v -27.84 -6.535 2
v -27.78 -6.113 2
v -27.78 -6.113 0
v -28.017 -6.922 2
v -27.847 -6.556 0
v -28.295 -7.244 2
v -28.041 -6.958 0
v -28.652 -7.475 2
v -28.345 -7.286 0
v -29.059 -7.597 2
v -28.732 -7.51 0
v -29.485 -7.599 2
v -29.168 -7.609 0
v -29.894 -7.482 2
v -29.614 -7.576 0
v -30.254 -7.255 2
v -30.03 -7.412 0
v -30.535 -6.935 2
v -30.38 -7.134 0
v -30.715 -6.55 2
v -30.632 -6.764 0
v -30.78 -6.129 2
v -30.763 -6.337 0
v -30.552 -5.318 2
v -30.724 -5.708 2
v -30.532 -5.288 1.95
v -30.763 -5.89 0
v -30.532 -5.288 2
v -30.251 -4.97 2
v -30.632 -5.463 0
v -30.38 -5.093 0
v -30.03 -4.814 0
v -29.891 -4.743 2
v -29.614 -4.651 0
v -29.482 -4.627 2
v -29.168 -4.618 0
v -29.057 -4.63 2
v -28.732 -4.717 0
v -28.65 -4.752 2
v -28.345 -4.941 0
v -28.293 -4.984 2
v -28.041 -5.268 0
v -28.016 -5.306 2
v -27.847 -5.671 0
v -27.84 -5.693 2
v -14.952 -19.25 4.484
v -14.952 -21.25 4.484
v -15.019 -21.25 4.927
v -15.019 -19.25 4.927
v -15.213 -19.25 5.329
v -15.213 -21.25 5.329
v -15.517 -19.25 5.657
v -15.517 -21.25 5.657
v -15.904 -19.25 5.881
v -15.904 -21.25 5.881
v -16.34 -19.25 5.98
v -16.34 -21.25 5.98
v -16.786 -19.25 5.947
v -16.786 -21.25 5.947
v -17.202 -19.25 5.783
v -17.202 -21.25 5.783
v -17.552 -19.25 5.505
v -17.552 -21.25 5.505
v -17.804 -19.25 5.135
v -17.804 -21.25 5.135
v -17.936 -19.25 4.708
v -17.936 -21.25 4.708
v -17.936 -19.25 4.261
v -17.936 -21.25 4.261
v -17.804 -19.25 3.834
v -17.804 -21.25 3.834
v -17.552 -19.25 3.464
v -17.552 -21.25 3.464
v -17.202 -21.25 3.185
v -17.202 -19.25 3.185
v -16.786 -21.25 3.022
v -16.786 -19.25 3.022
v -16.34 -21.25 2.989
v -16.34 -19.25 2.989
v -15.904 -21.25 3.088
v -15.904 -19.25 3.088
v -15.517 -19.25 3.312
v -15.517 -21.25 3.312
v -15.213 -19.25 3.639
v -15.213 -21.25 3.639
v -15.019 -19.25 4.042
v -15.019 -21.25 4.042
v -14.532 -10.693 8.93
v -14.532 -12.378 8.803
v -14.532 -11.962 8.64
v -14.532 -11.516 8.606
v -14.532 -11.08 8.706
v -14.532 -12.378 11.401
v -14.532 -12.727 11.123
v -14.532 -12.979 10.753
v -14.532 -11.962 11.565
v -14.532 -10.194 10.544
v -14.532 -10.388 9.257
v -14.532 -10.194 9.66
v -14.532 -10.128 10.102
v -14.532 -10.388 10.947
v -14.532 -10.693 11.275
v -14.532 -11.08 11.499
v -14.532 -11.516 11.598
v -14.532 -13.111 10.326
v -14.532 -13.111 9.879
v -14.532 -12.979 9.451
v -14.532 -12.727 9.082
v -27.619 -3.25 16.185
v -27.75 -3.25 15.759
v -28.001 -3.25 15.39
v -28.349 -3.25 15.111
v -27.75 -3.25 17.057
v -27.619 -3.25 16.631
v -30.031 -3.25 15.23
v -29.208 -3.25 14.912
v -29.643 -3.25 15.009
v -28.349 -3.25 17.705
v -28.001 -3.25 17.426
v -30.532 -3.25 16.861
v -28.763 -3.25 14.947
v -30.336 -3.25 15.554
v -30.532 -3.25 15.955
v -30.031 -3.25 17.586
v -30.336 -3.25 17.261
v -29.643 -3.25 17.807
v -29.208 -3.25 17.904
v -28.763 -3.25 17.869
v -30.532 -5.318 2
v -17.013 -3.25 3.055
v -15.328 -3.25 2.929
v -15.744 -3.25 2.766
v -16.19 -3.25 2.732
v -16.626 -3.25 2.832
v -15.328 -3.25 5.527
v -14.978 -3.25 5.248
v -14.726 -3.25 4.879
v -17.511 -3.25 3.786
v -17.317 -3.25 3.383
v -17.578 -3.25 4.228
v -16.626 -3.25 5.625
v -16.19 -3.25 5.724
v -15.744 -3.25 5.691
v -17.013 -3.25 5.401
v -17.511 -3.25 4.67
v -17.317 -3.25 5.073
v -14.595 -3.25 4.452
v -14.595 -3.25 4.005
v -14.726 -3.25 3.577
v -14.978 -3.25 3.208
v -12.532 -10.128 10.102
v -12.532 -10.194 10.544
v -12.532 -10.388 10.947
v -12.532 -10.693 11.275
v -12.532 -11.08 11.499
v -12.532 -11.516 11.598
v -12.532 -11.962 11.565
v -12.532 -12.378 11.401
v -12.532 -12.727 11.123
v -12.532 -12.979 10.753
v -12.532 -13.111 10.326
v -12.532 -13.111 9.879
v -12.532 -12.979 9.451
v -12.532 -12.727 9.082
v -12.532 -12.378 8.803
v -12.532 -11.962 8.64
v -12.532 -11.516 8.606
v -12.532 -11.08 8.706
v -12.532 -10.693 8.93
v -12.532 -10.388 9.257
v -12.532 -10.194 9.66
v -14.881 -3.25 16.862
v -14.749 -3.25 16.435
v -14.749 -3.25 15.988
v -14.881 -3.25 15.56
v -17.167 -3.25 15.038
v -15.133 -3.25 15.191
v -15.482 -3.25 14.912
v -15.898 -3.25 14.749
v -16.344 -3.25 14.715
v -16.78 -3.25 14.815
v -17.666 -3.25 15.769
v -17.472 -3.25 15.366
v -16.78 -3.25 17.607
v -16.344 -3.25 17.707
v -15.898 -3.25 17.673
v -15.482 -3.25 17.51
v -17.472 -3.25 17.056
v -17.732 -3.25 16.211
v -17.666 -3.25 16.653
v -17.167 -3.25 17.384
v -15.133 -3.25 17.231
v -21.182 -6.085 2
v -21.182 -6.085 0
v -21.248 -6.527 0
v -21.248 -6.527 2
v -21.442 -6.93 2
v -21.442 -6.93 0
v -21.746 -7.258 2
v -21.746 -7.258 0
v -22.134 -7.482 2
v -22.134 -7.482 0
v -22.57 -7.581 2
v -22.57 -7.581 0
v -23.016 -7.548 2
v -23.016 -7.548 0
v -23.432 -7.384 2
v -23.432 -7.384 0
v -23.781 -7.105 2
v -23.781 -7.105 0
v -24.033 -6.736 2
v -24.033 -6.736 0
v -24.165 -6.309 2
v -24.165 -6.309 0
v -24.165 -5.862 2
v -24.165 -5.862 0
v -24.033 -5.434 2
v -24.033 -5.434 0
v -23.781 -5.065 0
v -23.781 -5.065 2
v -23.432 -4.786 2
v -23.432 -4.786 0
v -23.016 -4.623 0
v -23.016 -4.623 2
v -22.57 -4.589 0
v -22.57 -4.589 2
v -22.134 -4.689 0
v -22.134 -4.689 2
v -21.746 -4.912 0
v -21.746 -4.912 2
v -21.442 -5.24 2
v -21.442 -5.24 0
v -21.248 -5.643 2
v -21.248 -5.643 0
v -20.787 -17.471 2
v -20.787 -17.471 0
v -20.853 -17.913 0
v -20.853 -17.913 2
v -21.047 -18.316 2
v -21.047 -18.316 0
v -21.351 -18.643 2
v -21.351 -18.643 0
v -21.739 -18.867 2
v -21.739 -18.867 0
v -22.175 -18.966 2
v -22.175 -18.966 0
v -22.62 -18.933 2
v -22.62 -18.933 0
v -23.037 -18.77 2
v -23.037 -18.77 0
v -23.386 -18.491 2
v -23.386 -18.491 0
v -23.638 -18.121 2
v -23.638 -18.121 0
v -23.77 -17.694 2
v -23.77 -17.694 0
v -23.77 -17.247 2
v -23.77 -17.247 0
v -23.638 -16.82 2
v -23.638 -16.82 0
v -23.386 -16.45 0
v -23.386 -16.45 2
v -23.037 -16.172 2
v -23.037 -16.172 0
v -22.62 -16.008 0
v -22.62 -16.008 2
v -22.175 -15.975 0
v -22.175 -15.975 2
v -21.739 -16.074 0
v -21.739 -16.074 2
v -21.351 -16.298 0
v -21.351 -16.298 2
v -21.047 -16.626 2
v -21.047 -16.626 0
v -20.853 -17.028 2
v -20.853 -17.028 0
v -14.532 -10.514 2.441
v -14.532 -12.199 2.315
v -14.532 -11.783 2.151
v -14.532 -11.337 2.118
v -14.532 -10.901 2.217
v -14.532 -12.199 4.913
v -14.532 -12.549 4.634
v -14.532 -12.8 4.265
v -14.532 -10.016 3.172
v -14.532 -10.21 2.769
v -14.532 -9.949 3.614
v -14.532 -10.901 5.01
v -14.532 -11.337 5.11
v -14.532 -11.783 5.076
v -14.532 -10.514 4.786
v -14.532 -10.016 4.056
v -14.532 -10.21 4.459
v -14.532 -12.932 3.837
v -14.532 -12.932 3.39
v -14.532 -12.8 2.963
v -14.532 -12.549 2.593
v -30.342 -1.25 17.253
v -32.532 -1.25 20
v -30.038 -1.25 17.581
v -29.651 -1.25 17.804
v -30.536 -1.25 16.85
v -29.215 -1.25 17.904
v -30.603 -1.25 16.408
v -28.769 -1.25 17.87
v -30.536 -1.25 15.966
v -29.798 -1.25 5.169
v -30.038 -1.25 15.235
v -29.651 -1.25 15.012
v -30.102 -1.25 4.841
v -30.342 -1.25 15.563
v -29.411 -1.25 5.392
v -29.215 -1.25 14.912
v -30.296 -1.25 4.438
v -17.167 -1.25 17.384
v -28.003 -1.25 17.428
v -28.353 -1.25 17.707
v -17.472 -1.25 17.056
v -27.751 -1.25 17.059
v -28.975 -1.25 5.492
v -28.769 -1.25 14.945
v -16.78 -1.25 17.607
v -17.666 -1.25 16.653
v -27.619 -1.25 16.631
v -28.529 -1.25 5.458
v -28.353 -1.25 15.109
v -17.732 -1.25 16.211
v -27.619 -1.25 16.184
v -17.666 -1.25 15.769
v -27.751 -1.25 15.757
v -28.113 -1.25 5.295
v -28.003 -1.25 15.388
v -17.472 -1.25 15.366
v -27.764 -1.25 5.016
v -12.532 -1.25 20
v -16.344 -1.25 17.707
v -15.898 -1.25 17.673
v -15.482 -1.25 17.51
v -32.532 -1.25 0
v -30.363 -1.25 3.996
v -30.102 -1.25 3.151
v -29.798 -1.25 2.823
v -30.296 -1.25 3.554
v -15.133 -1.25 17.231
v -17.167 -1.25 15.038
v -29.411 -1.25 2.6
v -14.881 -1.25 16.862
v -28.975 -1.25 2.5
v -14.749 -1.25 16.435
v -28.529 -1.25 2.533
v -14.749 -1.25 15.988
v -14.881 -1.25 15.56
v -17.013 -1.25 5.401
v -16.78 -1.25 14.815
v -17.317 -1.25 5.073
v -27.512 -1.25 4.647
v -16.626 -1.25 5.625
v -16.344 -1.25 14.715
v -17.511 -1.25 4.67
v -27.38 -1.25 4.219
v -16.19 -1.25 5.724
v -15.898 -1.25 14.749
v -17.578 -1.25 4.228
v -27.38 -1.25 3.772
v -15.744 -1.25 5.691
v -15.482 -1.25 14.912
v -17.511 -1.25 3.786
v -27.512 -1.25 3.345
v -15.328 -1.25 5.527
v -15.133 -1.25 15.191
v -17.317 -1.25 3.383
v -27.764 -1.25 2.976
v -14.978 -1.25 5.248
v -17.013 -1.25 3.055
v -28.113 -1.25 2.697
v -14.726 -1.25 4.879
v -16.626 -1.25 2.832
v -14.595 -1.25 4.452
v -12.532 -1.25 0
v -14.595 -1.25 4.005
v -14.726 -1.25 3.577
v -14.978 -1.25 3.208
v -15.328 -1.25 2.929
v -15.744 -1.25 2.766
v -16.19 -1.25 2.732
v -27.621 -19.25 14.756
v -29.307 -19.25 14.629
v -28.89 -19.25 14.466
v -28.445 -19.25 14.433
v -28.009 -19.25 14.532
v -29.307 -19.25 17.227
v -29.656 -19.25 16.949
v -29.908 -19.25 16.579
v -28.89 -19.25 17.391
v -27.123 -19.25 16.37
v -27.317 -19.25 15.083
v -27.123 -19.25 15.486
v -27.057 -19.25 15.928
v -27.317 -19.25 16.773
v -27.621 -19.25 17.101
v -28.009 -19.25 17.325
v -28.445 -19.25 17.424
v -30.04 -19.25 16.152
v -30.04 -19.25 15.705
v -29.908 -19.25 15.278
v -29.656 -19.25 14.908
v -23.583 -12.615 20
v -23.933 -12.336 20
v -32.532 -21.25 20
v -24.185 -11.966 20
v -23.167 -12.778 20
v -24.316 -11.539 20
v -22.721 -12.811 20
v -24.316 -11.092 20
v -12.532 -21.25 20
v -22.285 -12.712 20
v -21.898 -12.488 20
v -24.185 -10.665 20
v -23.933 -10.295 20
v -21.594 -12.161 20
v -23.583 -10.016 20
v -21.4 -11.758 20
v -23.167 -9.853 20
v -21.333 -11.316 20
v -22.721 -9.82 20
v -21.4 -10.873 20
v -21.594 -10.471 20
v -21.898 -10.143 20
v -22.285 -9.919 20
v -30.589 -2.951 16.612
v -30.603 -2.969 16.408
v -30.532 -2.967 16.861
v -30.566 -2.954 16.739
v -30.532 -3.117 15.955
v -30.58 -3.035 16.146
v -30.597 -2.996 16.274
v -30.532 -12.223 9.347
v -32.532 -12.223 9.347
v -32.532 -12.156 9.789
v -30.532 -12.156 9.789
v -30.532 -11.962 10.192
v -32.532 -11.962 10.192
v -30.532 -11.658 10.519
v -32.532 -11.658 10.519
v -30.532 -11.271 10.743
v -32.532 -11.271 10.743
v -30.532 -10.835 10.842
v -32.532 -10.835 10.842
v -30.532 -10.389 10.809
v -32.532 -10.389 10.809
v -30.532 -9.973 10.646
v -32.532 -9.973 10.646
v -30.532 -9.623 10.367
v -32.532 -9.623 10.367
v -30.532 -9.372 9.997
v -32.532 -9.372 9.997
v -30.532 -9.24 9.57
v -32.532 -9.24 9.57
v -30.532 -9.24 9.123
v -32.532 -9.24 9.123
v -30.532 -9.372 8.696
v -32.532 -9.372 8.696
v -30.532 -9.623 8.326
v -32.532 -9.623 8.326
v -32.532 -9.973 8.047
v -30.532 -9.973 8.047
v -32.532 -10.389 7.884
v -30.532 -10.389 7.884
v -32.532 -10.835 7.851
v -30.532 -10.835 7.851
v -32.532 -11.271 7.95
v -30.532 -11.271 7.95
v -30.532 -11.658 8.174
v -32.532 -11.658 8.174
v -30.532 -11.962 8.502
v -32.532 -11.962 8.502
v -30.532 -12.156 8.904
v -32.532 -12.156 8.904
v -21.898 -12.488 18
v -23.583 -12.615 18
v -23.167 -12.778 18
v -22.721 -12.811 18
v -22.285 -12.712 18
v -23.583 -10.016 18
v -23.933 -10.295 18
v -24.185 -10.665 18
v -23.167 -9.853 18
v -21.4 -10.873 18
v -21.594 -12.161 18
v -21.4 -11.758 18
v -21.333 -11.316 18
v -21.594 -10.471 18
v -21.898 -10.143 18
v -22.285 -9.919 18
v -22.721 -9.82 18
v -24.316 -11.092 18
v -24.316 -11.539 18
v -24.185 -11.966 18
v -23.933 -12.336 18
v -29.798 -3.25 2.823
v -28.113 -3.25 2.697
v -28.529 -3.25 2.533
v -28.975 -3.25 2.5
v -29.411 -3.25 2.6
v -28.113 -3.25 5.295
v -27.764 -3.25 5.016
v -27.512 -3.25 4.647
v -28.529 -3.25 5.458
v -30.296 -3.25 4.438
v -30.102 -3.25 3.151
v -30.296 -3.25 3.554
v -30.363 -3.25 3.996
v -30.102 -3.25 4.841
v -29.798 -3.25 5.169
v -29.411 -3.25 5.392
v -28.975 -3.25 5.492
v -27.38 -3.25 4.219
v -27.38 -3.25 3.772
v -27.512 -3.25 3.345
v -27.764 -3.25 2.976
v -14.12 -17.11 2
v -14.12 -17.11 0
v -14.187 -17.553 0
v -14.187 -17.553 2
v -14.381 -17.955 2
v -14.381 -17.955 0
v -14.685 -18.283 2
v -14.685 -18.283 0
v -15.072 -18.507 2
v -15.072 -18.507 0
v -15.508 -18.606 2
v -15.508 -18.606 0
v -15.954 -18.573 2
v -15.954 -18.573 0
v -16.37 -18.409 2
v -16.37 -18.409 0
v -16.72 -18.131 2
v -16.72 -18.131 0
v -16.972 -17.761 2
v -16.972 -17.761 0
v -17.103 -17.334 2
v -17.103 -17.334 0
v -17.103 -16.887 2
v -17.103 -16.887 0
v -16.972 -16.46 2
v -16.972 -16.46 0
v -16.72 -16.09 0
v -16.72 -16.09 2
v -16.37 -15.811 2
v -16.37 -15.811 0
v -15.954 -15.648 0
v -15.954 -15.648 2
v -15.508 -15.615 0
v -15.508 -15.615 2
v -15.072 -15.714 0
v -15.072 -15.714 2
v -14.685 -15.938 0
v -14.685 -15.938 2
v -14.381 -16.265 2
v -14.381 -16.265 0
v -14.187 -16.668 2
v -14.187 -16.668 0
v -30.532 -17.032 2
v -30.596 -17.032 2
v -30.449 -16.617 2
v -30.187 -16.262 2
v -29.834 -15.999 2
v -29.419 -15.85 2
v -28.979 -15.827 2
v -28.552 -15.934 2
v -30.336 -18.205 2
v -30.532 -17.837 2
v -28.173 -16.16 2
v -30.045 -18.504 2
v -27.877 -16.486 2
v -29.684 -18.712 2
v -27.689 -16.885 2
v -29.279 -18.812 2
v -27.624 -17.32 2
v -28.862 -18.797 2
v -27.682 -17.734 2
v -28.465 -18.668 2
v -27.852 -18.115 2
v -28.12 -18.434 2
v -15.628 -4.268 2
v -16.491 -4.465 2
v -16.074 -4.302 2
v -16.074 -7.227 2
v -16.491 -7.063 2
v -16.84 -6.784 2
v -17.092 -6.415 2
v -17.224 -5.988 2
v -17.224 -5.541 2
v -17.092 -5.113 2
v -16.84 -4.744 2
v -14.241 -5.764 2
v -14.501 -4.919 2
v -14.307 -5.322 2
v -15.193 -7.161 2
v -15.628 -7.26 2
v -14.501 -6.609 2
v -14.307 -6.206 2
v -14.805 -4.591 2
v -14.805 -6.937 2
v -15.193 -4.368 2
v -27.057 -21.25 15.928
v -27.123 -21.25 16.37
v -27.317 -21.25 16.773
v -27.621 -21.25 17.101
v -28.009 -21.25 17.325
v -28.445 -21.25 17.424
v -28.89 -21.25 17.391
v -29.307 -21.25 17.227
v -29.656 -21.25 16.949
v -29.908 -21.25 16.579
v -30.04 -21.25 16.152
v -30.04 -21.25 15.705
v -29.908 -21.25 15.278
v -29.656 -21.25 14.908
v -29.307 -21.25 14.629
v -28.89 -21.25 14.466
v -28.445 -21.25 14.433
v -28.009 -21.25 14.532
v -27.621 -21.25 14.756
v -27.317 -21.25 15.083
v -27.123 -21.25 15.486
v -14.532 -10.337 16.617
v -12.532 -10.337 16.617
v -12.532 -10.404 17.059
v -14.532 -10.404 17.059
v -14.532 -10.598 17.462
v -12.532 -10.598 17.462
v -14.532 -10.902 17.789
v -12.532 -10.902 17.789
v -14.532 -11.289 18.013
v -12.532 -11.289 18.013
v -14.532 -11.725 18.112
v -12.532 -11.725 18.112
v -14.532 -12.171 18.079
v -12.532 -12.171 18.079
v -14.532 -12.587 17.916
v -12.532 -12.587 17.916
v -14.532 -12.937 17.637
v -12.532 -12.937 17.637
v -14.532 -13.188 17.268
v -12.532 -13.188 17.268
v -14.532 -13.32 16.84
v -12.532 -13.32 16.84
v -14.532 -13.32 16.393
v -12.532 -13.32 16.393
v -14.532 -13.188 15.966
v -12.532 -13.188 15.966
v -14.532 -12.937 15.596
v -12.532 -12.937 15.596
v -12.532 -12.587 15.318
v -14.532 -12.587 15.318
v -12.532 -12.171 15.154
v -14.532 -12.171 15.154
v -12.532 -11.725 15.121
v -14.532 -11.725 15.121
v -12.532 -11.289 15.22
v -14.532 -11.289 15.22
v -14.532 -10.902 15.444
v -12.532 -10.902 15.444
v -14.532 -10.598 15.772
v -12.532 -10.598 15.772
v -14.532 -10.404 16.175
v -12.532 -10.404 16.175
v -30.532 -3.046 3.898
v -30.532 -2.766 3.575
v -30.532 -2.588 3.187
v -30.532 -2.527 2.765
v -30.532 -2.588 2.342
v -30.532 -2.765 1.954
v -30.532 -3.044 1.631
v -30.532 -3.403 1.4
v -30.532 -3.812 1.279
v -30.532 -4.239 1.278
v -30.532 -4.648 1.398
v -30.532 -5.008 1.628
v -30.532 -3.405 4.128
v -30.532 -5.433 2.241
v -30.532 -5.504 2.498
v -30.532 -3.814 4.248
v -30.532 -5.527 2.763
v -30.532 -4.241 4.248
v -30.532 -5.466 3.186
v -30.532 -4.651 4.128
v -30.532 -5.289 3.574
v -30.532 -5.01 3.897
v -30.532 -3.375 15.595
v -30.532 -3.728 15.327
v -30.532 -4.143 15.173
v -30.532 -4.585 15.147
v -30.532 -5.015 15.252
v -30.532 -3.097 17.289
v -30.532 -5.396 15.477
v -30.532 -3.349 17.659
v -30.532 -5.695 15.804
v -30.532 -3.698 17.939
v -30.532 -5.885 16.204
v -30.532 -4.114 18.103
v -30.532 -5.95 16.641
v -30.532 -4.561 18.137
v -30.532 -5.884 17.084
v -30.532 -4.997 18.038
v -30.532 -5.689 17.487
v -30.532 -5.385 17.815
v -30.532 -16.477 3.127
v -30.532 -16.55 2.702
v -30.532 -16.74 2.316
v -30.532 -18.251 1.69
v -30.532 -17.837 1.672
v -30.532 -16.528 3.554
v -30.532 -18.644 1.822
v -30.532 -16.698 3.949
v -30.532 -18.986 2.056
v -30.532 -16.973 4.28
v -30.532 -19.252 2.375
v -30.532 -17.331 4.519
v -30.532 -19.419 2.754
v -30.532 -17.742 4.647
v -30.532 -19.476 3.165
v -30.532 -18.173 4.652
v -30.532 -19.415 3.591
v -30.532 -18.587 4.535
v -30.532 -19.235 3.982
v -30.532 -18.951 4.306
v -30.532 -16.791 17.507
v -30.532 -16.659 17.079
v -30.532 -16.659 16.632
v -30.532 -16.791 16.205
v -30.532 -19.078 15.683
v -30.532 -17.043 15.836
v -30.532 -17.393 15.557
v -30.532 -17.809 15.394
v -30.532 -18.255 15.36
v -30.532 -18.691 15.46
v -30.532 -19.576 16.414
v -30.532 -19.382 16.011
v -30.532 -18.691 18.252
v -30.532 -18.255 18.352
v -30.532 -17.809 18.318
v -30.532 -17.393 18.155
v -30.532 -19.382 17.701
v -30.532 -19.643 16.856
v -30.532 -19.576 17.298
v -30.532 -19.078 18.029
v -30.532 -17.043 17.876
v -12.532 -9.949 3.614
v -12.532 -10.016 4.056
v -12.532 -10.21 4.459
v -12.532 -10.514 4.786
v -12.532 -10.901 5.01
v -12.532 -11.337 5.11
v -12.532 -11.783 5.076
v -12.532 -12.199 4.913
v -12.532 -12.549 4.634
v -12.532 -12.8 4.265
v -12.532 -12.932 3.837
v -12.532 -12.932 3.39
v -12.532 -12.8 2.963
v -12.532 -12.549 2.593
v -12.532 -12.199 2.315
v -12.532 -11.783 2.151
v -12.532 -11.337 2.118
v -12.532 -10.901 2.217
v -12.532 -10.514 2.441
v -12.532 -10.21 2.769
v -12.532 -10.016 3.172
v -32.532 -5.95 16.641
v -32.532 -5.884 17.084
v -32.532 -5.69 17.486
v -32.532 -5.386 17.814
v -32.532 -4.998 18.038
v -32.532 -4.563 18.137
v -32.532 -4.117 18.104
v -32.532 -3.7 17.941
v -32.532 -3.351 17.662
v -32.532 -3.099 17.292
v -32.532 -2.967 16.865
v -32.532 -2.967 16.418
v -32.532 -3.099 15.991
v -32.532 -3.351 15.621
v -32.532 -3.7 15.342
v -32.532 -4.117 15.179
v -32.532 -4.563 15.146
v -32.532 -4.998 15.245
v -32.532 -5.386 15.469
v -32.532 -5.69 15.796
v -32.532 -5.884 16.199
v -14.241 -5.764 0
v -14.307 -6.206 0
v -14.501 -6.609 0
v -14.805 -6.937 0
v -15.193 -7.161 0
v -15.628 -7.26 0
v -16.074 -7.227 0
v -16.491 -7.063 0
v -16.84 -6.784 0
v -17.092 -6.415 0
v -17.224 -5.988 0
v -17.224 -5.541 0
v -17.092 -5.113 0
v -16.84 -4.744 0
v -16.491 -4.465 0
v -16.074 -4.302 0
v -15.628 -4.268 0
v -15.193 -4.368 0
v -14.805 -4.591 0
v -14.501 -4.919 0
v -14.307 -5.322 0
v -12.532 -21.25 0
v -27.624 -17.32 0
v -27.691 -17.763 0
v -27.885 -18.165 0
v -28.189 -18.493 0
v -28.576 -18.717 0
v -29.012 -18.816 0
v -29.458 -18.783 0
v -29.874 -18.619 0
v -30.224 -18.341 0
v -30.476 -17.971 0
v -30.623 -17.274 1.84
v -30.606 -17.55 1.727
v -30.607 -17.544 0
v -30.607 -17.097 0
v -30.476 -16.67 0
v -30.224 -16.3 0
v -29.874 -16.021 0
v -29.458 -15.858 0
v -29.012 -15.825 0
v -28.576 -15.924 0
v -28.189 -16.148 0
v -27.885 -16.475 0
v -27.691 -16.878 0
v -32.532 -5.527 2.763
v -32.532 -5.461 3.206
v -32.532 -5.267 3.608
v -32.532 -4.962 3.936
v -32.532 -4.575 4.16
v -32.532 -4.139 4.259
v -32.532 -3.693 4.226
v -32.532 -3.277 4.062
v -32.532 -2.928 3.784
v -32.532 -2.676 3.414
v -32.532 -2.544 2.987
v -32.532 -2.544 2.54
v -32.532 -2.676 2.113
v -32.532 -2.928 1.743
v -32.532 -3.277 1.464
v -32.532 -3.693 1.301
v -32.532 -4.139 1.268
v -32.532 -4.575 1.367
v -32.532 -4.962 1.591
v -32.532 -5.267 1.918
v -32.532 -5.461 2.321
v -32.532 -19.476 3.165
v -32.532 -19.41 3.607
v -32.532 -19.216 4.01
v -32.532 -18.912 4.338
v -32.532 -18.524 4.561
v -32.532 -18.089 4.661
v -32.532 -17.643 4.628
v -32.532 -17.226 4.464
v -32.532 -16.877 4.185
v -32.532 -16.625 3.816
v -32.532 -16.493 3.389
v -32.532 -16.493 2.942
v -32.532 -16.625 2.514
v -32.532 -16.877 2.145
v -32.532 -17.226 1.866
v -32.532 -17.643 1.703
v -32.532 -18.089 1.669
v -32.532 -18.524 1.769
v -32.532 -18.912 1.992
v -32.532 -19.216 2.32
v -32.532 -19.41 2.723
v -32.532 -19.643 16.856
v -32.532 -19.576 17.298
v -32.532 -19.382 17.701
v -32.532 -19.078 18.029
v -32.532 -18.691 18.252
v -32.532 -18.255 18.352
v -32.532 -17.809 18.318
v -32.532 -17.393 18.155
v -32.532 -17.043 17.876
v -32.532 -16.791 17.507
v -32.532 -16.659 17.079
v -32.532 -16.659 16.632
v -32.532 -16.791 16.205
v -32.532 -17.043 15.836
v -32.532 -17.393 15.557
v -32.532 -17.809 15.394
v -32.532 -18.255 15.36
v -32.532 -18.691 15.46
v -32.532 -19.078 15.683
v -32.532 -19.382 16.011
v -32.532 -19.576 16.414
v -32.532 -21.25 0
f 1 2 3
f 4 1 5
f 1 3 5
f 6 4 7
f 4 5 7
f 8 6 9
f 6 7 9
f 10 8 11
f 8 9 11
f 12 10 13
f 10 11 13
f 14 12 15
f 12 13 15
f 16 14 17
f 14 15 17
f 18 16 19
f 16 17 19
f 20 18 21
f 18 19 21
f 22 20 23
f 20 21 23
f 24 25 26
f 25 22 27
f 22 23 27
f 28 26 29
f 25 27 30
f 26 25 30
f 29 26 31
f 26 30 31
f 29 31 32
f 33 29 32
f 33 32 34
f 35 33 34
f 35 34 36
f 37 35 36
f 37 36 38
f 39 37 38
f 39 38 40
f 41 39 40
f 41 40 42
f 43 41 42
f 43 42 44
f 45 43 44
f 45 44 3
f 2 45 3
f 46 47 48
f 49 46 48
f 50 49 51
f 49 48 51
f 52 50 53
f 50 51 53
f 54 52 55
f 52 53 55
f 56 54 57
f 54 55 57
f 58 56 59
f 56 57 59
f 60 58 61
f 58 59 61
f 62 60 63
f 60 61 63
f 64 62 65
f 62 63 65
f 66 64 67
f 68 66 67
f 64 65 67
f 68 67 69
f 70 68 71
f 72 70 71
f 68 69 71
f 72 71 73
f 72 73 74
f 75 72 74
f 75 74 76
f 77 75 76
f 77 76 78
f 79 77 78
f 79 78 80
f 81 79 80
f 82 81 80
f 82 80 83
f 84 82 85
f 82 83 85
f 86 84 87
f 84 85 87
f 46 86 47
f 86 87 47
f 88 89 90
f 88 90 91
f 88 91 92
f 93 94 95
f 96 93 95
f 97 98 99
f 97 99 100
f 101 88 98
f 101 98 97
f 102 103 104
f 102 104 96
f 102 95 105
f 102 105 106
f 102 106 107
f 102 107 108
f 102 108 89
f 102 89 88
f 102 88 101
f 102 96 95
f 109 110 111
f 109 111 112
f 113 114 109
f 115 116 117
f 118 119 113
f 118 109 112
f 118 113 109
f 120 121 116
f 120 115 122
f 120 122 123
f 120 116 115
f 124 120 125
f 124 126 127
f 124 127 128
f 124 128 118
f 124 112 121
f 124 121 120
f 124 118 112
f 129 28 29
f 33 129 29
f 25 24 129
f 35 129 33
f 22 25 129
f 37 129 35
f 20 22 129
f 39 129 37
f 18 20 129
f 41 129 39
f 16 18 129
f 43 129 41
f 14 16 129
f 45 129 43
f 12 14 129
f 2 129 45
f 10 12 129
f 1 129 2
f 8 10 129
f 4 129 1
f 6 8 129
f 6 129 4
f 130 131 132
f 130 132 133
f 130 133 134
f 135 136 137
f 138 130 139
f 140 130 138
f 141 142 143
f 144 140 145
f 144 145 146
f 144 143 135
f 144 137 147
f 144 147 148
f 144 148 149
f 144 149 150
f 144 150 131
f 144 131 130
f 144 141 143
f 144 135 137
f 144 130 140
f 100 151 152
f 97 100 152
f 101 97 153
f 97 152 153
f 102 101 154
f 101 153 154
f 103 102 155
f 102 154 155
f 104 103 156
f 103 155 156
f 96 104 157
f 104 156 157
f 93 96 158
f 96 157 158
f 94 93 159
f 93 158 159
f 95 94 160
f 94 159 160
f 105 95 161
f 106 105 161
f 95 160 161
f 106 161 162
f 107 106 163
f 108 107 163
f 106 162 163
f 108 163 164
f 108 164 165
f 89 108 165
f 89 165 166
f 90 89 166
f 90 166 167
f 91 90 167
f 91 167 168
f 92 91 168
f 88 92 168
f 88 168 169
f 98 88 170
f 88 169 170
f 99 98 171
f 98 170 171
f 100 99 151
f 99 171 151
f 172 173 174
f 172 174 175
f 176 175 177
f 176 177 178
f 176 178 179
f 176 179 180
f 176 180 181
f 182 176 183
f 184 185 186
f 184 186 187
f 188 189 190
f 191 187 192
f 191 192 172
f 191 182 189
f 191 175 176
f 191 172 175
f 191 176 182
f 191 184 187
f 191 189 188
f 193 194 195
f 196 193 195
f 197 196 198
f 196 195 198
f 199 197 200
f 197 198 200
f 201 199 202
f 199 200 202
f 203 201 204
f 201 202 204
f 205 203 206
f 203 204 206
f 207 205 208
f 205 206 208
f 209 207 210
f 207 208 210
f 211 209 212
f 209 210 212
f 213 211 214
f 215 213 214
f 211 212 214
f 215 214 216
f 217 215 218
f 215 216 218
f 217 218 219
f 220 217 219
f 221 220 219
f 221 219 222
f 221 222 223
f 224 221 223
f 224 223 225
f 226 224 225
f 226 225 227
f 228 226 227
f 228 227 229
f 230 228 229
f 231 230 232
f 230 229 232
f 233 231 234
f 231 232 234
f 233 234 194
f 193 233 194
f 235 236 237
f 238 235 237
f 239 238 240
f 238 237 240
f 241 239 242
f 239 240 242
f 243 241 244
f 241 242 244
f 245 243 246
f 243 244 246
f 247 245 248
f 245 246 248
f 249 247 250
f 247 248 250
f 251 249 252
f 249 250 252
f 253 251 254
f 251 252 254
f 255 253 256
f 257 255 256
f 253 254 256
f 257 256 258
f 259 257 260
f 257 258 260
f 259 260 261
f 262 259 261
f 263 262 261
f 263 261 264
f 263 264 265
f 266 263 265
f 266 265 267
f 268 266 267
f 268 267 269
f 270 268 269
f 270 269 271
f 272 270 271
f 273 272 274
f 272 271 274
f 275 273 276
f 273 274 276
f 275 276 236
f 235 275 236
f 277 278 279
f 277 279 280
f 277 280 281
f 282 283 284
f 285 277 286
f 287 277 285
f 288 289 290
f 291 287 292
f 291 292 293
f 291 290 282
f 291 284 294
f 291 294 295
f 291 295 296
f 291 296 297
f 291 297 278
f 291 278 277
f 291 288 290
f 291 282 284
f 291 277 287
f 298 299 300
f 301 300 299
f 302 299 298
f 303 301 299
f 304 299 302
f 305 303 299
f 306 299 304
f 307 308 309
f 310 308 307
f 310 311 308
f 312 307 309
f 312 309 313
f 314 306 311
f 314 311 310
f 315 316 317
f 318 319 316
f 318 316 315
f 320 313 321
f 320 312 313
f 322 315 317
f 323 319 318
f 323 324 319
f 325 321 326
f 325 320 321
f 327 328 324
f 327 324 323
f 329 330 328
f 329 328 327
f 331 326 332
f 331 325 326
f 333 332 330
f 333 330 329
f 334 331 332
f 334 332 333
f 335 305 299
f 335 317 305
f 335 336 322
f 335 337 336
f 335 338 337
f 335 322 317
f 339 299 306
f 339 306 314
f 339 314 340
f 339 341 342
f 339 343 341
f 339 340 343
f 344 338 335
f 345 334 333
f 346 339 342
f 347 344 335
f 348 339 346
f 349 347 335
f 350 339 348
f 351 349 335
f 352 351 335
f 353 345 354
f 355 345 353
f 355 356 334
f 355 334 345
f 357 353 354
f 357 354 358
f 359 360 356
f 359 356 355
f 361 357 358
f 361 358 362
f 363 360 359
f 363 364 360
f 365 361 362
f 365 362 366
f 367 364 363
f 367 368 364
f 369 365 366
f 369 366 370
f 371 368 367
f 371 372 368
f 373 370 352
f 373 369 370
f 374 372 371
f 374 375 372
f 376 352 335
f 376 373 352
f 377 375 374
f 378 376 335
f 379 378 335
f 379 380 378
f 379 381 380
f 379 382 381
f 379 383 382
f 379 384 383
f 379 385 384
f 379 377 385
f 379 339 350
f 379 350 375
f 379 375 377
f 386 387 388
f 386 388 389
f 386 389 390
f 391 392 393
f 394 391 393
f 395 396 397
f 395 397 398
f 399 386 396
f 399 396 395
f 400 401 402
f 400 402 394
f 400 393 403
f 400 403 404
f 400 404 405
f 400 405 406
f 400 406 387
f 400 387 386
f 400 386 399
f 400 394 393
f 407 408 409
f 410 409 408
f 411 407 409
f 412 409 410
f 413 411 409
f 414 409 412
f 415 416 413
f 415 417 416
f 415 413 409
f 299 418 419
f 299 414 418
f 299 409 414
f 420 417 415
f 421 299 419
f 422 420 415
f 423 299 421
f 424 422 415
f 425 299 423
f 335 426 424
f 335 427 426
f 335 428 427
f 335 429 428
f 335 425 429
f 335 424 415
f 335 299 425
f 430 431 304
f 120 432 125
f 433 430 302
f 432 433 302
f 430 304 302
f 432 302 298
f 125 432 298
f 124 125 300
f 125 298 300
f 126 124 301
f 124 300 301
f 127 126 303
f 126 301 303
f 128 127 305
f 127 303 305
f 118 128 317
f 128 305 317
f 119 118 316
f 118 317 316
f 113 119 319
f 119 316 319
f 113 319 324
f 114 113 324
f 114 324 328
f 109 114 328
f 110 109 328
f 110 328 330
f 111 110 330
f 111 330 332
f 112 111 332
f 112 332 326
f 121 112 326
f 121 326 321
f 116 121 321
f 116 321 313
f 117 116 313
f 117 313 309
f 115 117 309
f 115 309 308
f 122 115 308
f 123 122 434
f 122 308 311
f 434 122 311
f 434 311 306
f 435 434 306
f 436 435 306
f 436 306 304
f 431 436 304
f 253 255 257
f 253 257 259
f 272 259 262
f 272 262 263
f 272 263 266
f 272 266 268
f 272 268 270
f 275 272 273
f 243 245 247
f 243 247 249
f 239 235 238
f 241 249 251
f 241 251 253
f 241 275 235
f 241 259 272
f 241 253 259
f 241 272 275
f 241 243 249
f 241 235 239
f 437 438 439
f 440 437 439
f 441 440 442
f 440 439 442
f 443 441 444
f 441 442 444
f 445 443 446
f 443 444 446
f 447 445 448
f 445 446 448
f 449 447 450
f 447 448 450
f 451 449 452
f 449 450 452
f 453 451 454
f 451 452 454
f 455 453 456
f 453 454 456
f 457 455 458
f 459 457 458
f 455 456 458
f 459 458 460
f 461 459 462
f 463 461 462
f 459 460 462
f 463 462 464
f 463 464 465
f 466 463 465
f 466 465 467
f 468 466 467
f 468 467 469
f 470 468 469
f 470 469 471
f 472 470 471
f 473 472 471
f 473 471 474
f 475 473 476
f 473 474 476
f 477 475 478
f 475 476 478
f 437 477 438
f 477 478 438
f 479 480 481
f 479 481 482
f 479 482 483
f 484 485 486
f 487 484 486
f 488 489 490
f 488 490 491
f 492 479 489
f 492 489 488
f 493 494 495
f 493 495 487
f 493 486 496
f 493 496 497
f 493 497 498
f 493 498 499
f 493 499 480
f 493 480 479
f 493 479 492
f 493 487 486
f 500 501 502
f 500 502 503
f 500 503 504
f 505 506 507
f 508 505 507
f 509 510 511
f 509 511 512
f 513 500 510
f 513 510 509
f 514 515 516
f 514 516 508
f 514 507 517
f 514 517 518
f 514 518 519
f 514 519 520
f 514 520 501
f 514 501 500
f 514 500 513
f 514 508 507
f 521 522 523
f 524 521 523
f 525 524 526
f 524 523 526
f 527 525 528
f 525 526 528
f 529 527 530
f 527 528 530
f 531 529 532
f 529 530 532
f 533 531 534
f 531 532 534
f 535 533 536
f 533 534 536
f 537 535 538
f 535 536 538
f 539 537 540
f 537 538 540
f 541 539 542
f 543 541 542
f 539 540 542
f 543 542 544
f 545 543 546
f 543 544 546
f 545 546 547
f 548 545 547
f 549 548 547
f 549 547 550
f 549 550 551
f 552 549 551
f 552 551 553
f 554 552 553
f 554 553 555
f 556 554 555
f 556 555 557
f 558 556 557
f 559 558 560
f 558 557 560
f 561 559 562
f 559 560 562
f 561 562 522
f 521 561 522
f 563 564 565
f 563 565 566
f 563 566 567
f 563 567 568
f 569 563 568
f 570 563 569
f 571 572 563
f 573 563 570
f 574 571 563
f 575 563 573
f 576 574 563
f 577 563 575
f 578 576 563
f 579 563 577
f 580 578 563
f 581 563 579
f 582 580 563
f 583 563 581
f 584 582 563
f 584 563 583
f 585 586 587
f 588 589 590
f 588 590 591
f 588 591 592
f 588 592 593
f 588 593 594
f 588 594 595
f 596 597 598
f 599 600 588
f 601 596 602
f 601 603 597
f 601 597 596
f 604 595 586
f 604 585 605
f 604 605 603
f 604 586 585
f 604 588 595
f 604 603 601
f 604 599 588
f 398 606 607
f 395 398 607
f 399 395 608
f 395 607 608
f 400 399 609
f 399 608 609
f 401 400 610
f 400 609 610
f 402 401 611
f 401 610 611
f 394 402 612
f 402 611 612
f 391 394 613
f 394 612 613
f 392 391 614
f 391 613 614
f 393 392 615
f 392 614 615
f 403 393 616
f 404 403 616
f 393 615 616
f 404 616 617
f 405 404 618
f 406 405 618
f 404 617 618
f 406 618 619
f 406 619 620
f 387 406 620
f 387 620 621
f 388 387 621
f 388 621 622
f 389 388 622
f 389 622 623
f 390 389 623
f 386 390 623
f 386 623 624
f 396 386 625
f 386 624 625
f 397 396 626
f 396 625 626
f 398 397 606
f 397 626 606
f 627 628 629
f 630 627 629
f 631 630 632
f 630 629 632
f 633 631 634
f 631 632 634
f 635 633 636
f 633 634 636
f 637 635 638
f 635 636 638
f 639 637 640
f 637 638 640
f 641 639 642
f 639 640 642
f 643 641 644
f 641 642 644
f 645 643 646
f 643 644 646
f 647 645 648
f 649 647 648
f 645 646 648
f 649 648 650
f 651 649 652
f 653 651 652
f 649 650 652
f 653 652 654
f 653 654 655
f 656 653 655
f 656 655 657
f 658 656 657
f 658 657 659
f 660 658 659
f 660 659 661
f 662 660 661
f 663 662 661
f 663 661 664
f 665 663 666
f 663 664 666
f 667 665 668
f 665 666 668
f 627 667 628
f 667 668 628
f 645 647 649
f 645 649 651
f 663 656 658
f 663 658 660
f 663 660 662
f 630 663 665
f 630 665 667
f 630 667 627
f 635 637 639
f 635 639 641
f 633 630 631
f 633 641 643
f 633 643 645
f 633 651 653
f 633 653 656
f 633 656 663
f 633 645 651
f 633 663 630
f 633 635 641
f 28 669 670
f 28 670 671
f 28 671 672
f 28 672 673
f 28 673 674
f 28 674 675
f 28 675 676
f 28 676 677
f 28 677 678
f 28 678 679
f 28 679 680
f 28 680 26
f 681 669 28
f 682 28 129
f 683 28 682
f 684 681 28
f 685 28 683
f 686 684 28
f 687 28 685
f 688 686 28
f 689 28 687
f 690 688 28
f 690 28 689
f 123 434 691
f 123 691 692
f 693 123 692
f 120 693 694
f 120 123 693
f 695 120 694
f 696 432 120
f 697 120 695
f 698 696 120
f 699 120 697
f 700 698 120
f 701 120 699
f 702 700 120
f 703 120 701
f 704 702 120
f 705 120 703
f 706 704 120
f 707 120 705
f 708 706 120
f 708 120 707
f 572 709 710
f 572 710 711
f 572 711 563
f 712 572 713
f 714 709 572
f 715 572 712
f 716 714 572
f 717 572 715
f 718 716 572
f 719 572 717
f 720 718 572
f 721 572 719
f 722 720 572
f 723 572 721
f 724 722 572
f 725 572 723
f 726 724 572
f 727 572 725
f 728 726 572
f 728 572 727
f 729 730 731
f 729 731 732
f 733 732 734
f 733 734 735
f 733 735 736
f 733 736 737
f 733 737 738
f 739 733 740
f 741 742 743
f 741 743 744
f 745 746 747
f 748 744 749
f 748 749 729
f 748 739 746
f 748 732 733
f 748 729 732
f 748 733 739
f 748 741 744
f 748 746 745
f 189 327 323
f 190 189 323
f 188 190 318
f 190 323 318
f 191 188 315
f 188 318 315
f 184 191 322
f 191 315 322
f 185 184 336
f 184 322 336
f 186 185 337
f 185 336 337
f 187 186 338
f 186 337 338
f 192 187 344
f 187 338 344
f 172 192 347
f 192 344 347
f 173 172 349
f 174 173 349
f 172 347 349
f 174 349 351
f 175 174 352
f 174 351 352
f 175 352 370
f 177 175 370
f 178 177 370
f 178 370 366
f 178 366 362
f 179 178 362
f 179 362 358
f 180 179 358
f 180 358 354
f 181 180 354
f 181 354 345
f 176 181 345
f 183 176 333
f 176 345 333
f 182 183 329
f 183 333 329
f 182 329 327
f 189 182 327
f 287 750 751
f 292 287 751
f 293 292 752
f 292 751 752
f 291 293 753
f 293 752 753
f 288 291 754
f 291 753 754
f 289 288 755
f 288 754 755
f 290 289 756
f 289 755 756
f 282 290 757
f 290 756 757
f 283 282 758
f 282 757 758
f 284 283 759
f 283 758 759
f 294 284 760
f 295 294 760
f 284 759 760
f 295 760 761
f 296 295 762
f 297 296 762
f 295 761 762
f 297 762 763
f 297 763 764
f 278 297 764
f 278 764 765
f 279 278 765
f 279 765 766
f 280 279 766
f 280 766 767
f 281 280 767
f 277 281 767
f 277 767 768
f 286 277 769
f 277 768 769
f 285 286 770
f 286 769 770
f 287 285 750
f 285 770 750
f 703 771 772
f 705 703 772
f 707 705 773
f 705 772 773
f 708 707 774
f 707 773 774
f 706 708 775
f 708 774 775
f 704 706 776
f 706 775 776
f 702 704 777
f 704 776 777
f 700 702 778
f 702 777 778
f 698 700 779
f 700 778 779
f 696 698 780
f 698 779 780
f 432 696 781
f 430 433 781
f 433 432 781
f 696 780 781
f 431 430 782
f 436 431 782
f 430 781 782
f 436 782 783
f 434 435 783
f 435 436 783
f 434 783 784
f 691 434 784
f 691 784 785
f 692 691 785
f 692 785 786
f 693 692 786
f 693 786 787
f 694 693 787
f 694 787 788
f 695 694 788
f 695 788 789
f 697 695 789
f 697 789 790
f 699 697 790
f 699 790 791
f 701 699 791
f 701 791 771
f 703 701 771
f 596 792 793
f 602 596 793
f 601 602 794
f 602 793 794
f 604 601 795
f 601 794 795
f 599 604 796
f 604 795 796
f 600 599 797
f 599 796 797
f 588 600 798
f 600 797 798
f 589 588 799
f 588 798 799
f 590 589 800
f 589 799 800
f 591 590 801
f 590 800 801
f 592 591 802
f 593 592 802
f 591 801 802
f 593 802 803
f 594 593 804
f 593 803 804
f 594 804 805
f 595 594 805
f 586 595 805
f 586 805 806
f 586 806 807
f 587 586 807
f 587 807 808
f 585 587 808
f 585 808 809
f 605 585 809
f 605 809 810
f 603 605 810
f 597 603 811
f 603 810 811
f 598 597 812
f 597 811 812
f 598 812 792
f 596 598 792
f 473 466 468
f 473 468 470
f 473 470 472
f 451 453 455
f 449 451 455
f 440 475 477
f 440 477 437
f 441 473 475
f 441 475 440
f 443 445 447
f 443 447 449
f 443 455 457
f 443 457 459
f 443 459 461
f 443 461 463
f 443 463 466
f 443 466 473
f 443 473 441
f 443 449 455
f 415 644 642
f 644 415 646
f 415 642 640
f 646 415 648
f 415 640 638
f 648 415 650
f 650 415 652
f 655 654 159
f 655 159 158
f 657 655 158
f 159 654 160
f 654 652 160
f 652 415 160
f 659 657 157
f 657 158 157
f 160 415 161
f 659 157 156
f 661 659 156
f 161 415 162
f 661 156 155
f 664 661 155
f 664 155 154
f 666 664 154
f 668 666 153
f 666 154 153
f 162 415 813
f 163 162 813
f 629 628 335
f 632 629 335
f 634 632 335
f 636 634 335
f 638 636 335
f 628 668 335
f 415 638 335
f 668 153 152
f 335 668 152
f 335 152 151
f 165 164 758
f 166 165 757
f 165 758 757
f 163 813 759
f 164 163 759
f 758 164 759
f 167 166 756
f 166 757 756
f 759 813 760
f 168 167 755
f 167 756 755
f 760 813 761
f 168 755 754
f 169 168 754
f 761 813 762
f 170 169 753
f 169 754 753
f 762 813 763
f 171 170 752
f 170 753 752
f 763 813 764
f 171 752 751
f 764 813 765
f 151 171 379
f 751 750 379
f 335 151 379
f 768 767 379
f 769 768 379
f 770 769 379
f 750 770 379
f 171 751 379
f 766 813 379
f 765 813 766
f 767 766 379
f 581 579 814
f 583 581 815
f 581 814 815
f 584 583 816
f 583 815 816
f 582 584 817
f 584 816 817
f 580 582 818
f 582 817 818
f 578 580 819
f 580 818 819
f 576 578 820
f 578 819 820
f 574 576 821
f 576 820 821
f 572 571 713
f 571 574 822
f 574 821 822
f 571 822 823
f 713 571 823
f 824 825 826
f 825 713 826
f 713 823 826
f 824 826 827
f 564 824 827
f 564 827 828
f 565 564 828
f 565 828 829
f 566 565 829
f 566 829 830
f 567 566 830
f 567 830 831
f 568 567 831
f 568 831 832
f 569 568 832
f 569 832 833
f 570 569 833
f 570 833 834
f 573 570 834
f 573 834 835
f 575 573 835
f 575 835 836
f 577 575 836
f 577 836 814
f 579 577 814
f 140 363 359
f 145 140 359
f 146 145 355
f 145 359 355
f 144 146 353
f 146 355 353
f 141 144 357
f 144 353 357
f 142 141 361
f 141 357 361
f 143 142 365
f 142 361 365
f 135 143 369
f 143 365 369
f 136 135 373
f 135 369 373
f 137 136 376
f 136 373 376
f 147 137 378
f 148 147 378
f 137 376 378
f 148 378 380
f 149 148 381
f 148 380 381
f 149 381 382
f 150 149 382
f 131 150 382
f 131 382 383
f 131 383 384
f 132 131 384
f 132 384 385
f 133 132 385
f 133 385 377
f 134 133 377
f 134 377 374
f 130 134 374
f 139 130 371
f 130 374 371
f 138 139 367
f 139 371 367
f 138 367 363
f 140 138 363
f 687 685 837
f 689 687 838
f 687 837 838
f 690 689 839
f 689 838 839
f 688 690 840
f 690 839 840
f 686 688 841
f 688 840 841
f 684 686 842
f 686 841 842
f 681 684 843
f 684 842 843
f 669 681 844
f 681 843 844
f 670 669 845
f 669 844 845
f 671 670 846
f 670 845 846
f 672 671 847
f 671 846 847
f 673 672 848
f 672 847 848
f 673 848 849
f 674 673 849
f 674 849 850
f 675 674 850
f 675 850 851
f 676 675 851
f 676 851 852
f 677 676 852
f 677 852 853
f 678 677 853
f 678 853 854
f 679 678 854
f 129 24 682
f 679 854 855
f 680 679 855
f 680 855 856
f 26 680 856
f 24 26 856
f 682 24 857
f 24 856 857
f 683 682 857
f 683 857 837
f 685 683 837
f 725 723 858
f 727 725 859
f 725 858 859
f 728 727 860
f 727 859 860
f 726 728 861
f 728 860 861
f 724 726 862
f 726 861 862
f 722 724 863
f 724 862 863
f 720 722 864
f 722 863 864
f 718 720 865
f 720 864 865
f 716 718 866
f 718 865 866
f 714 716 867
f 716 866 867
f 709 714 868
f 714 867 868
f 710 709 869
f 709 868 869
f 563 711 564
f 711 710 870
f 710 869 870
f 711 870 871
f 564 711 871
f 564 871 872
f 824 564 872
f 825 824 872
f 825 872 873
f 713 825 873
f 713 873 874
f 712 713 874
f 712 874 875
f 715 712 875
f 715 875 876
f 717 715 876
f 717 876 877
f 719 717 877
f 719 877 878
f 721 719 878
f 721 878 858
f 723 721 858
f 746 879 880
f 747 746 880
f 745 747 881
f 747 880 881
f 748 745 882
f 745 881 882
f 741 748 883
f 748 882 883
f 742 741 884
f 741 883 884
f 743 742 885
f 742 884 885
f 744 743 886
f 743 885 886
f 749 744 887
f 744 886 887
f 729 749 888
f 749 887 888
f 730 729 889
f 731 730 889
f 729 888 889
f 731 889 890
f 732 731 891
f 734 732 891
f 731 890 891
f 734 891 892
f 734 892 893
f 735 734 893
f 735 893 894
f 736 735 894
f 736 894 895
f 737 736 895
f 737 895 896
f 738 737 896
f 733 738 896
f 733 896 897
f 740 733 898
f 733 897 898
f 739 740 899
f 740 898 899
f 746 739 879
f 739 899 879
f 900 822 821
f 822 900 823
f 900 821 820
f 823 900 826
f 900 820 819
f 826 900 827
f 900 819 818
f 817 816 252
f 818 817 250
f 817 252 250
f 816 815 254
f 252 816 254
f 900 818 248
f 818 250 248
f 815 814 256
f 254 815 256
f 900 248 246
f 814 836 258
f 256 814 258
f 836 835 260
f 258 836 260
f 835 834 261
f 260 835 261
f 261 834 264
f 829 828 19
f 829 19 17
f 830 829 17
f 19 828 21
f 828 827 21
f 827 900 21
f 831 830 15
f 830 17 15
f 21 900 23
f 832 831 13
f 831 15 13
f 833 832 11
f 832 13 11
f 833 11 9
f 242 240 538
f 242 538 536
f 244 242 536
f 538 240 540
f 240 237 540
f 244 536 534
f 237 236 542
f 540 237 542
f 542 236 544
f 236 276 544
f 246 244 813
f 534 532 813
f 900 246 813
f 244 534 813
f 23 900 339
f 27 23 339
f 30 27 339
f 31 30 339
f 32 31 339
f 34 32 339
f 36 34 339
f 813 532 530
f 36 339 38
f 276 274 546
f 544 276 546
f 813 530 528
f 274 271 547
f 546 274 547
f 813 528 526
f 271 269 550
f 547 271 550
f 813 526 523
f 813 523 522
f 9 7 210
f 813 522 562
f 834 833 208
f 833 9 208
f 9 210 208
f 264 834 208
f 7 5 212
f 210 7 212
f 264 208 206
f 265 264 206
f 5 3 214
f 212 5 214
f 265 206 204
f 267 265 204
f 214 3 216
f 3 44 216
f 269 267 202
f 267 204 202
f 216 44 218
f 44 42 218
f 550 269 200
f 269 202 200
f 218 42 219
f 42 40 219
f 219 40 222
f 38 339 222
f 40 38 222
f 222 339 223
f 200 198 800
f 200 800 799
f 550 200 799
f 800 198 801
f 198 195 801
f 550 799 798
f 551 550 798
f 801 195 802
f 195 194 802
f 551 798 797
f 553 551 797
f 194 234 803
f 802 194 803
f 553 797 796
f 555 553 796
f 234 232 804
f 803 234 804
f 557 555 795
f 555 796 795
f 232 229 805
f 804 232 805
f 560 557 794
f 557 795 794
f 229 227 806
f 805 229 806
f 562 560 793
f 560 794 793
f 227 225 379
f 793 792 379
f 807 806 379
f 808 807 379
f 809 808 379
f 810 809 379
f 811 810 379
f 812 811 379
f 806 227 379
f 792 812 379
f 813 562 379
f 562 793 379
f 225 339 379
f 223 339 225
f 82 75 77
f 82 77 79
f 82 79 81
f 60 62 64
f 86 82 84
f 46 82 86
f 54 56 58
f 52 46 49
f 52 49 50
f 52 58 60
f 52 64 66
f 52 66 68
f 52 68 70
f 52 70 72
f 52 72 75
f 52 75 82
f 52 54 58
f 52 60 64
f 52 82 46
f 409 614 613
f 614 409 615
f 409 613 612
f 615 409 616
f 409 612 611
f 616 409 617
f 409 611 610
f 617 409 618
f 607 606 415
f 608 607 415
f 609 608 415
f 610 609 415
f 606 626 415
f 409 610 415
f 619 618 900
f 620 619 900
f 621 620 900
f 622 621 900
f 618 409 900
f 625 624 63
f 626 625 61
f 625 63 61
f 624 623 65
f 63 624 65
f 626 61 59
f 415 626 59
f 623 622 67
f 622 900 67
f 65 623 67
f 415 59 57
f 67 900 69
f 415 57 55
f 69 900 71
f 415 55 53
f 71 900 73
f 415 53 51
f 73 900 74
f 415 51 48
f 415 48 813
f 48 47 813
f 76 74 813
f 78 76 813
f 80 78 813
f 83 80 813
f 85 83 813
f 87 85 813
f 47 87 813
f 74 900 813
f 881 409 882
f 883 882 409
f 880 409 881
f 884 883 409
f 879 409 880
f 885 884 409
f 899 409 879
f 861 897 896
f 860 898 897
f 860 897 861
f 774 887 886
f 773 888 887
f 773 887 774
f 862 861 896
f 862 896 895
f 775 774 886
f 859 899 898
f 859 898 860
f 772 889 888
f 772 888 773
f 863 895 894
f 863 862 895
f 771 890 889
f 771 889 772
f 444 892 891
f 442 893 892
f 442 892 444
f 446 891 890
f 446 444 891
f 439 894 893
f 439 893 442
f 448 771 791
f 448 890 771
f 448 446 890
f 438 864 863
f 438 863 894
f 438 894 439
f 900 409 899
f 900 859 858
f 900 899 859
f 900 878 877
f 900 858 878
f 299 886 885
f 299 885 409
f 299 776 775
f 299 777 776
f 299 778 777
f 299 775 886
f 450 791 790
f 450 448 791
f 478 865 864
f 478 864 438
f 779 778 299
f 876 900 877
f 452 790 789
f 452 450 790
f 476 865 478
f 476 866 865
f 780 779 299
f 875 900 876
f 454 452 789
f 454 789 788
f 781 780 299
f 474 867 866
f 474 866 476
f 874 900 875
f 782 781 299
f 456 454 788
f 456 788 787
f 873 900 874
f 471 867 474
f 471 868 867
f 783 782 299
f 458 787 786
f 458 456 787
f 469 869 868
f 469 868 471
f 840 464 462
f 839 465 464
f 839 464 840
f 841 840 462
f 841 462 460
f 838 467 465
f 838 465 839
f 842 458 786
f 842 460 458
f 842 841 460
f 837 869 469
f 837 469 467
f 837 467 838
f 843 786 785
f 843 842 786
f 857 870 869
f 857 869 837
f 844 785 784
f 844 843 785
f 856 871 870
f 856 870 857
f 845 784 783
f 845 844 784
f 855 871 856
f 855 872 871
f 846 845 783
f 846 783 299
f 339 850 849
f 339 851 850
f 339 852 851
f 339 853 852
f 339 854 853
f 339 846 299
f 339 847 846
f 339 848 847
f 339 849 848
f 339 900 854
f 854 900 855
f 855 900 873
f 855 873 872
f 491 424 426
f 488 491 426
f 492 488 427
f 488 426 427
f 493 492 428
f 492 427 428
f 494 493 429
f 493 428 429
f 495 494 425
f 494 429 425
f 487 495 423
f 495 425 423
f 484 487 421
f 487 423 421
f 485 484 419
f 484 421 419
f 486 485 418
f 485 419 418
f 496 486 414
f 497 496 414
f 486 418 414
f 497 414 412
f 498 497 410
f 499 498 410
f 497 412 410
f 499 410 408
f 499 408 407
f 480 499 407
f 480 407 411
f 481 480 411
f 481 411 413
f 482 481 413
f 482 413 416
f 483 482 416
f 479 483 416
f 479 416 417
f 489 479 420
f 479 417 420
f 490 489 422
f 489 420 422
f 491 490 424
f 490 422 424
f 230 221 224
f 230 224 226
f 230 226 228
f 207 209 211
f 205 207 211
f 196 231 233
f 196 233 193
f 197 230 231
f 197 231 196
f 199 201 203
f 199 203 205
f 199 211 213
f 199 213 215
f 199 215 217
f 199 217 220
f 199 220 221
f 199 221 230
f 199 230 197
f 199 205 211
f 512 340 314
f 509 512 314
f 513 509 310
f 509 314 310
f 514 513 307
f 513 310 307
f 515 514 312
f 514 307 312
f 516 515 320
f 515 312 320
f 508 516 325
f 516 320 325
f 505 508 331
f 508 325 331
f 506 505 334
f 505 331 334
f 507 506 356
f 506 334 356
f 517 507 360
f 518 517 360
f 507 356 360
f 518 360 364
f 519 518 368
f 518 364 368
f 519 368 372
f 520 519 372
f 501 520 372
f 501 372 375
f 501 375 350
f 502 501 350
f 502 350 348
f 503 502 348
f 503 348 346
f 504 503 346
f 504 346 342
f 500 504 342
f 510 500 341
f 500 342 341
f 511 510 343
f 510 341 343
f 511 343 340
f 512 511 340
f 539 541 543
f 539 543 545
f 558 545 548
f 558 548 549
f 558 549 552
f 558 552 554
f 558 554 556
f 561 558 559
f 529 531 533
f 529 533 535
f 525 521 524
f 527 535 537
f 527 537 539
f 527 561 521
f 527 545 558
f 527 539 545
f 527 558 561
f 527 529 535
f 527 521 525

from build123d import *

# Parameters (mm, degrees)
F0_W      = 20
F0_H      = 20
F1_DEPTH  = 20
F2_R      = 1.5
F3_DEPTH  = 2
F4_R      = 1.5
F5_DEPTH  = 2
F6_R      = 1.5
F7_DEPTH  = 2
F8_R      = 1.5
F9_DEPTH  = 2
F10_R     = 1.5
F11_DEPTH = 2
F12_R     = 1.5
F13_DEPTH = 2


with BuildPart() as f1:
    # F0 (on Top) → F1 (new body)
    with BuildSketch(Plane.XY):
        with Locations((-22.53249, -11.250252)):
            Rectangle(F0_W, F0_H)
    extrude(amount=F1_DEPTH)

    # F2 (on face) → F3 (cut)
    with BuildSketch(Plane.XY.offset(20)):
        with Locations((-22.833129, -11.315533)):
            Circle(F2_R)
    extrude(amount=-F3_DEPTH, mode=Mode.SUBTRACT)

    # F4 (on face) → F5 (cut)
    with BuildSketch(Plane.XZ.offset(21.250252)):
        with Locations((-28.556654, 15.928326)):
            Circle(F4_R)
        with Locations((-16.452408, 4.484393)):
            Circle(F4_R)
    extrude(amount=-F5_DEPTH, mode=Mode.SUBTRACT)

    # F6 (on face) → F7 (cut)
    with BuildSketch(Plane.YZ.offset(-12.53249)):
        with Locations((-11.837029, 16.616692)):
            Circle(F6_R)
        with Locations((-11.448925, 3.613711)):
            Circle(F6_R)
        with Locations((-11.627831, 10.102251)):
            Circle(F6_R)
    extrude(amount=-F7_DEPTH, mode=Mode.SUBTRACT)

    # F8 (on face) → F9 (cut)
    with BuildSketch(Plane(origin=(0, -1.250252, 0), x_dir=(-1, 0, 0), z_dir=(0, 1, 0))):
        with Locations((16.232165, 16.211085)):
            Circle(F8_R)
        with Locations((29.102561, 16.407891)):
            Circle(F8_R)
        with Locations((28.863132, 3.995854)):
            Circle(F8_R)
        with Locations((16.077781, 4.228219)):
            Circle(F8_R)
    extrude(amount=-F9_DEPTH, mode=Mode.SUBTRACT)

    # F10 (on face) → F11 (cut)
    with BuildSketch(Plane(origin=(-32.53249, 0, 0), x_dir=(0, -1, 0), z_dir=(-1, 0, 0))):
        with Locations((18.142659, 16.85593)):
            Circle(F10_R)
        with Locations((17.976478, 3.165177)):
            Circle(F10_R)
        with Locations((4.45046, 16.641465)):
            Circle(F10_R)
        with Locations((10.722963, 9.346528)):
            Circle(F10_R)
        with Locations((4.027196, 2.76337)):
            Circle(F10_R)
    extrude(amount=-F11_DEPTH, mode=Mode.SUBTRACT)

    # F12 (on face) → F13 (cut)
    with BuildSketch(Plane(origin=(0, 0, 0), x_dir=(1, 0, 0), z_dir=(0, 0, -1))):
        with Locations((-15.62013, 17.110417)):
            Circle(F12_R)
        with Locations((-22.286659, 17.470592)):
            Circle(F12_R)
        with Locations((-29.12412, 17.320384)):
            Circle(F12_R)
        with Locations((-29.280099, 6.113375)):
            Circle(F12_R)
        with Locations((-22.681733, 6.085219)):
            Circle(F12_R)
        with Locations((-15.74056, 5.76421)):
            Circle(F12_R)
    extrude(amount=-F13_DEPTH, mode=Mode.SUBTRACT)


solid = f1.part
